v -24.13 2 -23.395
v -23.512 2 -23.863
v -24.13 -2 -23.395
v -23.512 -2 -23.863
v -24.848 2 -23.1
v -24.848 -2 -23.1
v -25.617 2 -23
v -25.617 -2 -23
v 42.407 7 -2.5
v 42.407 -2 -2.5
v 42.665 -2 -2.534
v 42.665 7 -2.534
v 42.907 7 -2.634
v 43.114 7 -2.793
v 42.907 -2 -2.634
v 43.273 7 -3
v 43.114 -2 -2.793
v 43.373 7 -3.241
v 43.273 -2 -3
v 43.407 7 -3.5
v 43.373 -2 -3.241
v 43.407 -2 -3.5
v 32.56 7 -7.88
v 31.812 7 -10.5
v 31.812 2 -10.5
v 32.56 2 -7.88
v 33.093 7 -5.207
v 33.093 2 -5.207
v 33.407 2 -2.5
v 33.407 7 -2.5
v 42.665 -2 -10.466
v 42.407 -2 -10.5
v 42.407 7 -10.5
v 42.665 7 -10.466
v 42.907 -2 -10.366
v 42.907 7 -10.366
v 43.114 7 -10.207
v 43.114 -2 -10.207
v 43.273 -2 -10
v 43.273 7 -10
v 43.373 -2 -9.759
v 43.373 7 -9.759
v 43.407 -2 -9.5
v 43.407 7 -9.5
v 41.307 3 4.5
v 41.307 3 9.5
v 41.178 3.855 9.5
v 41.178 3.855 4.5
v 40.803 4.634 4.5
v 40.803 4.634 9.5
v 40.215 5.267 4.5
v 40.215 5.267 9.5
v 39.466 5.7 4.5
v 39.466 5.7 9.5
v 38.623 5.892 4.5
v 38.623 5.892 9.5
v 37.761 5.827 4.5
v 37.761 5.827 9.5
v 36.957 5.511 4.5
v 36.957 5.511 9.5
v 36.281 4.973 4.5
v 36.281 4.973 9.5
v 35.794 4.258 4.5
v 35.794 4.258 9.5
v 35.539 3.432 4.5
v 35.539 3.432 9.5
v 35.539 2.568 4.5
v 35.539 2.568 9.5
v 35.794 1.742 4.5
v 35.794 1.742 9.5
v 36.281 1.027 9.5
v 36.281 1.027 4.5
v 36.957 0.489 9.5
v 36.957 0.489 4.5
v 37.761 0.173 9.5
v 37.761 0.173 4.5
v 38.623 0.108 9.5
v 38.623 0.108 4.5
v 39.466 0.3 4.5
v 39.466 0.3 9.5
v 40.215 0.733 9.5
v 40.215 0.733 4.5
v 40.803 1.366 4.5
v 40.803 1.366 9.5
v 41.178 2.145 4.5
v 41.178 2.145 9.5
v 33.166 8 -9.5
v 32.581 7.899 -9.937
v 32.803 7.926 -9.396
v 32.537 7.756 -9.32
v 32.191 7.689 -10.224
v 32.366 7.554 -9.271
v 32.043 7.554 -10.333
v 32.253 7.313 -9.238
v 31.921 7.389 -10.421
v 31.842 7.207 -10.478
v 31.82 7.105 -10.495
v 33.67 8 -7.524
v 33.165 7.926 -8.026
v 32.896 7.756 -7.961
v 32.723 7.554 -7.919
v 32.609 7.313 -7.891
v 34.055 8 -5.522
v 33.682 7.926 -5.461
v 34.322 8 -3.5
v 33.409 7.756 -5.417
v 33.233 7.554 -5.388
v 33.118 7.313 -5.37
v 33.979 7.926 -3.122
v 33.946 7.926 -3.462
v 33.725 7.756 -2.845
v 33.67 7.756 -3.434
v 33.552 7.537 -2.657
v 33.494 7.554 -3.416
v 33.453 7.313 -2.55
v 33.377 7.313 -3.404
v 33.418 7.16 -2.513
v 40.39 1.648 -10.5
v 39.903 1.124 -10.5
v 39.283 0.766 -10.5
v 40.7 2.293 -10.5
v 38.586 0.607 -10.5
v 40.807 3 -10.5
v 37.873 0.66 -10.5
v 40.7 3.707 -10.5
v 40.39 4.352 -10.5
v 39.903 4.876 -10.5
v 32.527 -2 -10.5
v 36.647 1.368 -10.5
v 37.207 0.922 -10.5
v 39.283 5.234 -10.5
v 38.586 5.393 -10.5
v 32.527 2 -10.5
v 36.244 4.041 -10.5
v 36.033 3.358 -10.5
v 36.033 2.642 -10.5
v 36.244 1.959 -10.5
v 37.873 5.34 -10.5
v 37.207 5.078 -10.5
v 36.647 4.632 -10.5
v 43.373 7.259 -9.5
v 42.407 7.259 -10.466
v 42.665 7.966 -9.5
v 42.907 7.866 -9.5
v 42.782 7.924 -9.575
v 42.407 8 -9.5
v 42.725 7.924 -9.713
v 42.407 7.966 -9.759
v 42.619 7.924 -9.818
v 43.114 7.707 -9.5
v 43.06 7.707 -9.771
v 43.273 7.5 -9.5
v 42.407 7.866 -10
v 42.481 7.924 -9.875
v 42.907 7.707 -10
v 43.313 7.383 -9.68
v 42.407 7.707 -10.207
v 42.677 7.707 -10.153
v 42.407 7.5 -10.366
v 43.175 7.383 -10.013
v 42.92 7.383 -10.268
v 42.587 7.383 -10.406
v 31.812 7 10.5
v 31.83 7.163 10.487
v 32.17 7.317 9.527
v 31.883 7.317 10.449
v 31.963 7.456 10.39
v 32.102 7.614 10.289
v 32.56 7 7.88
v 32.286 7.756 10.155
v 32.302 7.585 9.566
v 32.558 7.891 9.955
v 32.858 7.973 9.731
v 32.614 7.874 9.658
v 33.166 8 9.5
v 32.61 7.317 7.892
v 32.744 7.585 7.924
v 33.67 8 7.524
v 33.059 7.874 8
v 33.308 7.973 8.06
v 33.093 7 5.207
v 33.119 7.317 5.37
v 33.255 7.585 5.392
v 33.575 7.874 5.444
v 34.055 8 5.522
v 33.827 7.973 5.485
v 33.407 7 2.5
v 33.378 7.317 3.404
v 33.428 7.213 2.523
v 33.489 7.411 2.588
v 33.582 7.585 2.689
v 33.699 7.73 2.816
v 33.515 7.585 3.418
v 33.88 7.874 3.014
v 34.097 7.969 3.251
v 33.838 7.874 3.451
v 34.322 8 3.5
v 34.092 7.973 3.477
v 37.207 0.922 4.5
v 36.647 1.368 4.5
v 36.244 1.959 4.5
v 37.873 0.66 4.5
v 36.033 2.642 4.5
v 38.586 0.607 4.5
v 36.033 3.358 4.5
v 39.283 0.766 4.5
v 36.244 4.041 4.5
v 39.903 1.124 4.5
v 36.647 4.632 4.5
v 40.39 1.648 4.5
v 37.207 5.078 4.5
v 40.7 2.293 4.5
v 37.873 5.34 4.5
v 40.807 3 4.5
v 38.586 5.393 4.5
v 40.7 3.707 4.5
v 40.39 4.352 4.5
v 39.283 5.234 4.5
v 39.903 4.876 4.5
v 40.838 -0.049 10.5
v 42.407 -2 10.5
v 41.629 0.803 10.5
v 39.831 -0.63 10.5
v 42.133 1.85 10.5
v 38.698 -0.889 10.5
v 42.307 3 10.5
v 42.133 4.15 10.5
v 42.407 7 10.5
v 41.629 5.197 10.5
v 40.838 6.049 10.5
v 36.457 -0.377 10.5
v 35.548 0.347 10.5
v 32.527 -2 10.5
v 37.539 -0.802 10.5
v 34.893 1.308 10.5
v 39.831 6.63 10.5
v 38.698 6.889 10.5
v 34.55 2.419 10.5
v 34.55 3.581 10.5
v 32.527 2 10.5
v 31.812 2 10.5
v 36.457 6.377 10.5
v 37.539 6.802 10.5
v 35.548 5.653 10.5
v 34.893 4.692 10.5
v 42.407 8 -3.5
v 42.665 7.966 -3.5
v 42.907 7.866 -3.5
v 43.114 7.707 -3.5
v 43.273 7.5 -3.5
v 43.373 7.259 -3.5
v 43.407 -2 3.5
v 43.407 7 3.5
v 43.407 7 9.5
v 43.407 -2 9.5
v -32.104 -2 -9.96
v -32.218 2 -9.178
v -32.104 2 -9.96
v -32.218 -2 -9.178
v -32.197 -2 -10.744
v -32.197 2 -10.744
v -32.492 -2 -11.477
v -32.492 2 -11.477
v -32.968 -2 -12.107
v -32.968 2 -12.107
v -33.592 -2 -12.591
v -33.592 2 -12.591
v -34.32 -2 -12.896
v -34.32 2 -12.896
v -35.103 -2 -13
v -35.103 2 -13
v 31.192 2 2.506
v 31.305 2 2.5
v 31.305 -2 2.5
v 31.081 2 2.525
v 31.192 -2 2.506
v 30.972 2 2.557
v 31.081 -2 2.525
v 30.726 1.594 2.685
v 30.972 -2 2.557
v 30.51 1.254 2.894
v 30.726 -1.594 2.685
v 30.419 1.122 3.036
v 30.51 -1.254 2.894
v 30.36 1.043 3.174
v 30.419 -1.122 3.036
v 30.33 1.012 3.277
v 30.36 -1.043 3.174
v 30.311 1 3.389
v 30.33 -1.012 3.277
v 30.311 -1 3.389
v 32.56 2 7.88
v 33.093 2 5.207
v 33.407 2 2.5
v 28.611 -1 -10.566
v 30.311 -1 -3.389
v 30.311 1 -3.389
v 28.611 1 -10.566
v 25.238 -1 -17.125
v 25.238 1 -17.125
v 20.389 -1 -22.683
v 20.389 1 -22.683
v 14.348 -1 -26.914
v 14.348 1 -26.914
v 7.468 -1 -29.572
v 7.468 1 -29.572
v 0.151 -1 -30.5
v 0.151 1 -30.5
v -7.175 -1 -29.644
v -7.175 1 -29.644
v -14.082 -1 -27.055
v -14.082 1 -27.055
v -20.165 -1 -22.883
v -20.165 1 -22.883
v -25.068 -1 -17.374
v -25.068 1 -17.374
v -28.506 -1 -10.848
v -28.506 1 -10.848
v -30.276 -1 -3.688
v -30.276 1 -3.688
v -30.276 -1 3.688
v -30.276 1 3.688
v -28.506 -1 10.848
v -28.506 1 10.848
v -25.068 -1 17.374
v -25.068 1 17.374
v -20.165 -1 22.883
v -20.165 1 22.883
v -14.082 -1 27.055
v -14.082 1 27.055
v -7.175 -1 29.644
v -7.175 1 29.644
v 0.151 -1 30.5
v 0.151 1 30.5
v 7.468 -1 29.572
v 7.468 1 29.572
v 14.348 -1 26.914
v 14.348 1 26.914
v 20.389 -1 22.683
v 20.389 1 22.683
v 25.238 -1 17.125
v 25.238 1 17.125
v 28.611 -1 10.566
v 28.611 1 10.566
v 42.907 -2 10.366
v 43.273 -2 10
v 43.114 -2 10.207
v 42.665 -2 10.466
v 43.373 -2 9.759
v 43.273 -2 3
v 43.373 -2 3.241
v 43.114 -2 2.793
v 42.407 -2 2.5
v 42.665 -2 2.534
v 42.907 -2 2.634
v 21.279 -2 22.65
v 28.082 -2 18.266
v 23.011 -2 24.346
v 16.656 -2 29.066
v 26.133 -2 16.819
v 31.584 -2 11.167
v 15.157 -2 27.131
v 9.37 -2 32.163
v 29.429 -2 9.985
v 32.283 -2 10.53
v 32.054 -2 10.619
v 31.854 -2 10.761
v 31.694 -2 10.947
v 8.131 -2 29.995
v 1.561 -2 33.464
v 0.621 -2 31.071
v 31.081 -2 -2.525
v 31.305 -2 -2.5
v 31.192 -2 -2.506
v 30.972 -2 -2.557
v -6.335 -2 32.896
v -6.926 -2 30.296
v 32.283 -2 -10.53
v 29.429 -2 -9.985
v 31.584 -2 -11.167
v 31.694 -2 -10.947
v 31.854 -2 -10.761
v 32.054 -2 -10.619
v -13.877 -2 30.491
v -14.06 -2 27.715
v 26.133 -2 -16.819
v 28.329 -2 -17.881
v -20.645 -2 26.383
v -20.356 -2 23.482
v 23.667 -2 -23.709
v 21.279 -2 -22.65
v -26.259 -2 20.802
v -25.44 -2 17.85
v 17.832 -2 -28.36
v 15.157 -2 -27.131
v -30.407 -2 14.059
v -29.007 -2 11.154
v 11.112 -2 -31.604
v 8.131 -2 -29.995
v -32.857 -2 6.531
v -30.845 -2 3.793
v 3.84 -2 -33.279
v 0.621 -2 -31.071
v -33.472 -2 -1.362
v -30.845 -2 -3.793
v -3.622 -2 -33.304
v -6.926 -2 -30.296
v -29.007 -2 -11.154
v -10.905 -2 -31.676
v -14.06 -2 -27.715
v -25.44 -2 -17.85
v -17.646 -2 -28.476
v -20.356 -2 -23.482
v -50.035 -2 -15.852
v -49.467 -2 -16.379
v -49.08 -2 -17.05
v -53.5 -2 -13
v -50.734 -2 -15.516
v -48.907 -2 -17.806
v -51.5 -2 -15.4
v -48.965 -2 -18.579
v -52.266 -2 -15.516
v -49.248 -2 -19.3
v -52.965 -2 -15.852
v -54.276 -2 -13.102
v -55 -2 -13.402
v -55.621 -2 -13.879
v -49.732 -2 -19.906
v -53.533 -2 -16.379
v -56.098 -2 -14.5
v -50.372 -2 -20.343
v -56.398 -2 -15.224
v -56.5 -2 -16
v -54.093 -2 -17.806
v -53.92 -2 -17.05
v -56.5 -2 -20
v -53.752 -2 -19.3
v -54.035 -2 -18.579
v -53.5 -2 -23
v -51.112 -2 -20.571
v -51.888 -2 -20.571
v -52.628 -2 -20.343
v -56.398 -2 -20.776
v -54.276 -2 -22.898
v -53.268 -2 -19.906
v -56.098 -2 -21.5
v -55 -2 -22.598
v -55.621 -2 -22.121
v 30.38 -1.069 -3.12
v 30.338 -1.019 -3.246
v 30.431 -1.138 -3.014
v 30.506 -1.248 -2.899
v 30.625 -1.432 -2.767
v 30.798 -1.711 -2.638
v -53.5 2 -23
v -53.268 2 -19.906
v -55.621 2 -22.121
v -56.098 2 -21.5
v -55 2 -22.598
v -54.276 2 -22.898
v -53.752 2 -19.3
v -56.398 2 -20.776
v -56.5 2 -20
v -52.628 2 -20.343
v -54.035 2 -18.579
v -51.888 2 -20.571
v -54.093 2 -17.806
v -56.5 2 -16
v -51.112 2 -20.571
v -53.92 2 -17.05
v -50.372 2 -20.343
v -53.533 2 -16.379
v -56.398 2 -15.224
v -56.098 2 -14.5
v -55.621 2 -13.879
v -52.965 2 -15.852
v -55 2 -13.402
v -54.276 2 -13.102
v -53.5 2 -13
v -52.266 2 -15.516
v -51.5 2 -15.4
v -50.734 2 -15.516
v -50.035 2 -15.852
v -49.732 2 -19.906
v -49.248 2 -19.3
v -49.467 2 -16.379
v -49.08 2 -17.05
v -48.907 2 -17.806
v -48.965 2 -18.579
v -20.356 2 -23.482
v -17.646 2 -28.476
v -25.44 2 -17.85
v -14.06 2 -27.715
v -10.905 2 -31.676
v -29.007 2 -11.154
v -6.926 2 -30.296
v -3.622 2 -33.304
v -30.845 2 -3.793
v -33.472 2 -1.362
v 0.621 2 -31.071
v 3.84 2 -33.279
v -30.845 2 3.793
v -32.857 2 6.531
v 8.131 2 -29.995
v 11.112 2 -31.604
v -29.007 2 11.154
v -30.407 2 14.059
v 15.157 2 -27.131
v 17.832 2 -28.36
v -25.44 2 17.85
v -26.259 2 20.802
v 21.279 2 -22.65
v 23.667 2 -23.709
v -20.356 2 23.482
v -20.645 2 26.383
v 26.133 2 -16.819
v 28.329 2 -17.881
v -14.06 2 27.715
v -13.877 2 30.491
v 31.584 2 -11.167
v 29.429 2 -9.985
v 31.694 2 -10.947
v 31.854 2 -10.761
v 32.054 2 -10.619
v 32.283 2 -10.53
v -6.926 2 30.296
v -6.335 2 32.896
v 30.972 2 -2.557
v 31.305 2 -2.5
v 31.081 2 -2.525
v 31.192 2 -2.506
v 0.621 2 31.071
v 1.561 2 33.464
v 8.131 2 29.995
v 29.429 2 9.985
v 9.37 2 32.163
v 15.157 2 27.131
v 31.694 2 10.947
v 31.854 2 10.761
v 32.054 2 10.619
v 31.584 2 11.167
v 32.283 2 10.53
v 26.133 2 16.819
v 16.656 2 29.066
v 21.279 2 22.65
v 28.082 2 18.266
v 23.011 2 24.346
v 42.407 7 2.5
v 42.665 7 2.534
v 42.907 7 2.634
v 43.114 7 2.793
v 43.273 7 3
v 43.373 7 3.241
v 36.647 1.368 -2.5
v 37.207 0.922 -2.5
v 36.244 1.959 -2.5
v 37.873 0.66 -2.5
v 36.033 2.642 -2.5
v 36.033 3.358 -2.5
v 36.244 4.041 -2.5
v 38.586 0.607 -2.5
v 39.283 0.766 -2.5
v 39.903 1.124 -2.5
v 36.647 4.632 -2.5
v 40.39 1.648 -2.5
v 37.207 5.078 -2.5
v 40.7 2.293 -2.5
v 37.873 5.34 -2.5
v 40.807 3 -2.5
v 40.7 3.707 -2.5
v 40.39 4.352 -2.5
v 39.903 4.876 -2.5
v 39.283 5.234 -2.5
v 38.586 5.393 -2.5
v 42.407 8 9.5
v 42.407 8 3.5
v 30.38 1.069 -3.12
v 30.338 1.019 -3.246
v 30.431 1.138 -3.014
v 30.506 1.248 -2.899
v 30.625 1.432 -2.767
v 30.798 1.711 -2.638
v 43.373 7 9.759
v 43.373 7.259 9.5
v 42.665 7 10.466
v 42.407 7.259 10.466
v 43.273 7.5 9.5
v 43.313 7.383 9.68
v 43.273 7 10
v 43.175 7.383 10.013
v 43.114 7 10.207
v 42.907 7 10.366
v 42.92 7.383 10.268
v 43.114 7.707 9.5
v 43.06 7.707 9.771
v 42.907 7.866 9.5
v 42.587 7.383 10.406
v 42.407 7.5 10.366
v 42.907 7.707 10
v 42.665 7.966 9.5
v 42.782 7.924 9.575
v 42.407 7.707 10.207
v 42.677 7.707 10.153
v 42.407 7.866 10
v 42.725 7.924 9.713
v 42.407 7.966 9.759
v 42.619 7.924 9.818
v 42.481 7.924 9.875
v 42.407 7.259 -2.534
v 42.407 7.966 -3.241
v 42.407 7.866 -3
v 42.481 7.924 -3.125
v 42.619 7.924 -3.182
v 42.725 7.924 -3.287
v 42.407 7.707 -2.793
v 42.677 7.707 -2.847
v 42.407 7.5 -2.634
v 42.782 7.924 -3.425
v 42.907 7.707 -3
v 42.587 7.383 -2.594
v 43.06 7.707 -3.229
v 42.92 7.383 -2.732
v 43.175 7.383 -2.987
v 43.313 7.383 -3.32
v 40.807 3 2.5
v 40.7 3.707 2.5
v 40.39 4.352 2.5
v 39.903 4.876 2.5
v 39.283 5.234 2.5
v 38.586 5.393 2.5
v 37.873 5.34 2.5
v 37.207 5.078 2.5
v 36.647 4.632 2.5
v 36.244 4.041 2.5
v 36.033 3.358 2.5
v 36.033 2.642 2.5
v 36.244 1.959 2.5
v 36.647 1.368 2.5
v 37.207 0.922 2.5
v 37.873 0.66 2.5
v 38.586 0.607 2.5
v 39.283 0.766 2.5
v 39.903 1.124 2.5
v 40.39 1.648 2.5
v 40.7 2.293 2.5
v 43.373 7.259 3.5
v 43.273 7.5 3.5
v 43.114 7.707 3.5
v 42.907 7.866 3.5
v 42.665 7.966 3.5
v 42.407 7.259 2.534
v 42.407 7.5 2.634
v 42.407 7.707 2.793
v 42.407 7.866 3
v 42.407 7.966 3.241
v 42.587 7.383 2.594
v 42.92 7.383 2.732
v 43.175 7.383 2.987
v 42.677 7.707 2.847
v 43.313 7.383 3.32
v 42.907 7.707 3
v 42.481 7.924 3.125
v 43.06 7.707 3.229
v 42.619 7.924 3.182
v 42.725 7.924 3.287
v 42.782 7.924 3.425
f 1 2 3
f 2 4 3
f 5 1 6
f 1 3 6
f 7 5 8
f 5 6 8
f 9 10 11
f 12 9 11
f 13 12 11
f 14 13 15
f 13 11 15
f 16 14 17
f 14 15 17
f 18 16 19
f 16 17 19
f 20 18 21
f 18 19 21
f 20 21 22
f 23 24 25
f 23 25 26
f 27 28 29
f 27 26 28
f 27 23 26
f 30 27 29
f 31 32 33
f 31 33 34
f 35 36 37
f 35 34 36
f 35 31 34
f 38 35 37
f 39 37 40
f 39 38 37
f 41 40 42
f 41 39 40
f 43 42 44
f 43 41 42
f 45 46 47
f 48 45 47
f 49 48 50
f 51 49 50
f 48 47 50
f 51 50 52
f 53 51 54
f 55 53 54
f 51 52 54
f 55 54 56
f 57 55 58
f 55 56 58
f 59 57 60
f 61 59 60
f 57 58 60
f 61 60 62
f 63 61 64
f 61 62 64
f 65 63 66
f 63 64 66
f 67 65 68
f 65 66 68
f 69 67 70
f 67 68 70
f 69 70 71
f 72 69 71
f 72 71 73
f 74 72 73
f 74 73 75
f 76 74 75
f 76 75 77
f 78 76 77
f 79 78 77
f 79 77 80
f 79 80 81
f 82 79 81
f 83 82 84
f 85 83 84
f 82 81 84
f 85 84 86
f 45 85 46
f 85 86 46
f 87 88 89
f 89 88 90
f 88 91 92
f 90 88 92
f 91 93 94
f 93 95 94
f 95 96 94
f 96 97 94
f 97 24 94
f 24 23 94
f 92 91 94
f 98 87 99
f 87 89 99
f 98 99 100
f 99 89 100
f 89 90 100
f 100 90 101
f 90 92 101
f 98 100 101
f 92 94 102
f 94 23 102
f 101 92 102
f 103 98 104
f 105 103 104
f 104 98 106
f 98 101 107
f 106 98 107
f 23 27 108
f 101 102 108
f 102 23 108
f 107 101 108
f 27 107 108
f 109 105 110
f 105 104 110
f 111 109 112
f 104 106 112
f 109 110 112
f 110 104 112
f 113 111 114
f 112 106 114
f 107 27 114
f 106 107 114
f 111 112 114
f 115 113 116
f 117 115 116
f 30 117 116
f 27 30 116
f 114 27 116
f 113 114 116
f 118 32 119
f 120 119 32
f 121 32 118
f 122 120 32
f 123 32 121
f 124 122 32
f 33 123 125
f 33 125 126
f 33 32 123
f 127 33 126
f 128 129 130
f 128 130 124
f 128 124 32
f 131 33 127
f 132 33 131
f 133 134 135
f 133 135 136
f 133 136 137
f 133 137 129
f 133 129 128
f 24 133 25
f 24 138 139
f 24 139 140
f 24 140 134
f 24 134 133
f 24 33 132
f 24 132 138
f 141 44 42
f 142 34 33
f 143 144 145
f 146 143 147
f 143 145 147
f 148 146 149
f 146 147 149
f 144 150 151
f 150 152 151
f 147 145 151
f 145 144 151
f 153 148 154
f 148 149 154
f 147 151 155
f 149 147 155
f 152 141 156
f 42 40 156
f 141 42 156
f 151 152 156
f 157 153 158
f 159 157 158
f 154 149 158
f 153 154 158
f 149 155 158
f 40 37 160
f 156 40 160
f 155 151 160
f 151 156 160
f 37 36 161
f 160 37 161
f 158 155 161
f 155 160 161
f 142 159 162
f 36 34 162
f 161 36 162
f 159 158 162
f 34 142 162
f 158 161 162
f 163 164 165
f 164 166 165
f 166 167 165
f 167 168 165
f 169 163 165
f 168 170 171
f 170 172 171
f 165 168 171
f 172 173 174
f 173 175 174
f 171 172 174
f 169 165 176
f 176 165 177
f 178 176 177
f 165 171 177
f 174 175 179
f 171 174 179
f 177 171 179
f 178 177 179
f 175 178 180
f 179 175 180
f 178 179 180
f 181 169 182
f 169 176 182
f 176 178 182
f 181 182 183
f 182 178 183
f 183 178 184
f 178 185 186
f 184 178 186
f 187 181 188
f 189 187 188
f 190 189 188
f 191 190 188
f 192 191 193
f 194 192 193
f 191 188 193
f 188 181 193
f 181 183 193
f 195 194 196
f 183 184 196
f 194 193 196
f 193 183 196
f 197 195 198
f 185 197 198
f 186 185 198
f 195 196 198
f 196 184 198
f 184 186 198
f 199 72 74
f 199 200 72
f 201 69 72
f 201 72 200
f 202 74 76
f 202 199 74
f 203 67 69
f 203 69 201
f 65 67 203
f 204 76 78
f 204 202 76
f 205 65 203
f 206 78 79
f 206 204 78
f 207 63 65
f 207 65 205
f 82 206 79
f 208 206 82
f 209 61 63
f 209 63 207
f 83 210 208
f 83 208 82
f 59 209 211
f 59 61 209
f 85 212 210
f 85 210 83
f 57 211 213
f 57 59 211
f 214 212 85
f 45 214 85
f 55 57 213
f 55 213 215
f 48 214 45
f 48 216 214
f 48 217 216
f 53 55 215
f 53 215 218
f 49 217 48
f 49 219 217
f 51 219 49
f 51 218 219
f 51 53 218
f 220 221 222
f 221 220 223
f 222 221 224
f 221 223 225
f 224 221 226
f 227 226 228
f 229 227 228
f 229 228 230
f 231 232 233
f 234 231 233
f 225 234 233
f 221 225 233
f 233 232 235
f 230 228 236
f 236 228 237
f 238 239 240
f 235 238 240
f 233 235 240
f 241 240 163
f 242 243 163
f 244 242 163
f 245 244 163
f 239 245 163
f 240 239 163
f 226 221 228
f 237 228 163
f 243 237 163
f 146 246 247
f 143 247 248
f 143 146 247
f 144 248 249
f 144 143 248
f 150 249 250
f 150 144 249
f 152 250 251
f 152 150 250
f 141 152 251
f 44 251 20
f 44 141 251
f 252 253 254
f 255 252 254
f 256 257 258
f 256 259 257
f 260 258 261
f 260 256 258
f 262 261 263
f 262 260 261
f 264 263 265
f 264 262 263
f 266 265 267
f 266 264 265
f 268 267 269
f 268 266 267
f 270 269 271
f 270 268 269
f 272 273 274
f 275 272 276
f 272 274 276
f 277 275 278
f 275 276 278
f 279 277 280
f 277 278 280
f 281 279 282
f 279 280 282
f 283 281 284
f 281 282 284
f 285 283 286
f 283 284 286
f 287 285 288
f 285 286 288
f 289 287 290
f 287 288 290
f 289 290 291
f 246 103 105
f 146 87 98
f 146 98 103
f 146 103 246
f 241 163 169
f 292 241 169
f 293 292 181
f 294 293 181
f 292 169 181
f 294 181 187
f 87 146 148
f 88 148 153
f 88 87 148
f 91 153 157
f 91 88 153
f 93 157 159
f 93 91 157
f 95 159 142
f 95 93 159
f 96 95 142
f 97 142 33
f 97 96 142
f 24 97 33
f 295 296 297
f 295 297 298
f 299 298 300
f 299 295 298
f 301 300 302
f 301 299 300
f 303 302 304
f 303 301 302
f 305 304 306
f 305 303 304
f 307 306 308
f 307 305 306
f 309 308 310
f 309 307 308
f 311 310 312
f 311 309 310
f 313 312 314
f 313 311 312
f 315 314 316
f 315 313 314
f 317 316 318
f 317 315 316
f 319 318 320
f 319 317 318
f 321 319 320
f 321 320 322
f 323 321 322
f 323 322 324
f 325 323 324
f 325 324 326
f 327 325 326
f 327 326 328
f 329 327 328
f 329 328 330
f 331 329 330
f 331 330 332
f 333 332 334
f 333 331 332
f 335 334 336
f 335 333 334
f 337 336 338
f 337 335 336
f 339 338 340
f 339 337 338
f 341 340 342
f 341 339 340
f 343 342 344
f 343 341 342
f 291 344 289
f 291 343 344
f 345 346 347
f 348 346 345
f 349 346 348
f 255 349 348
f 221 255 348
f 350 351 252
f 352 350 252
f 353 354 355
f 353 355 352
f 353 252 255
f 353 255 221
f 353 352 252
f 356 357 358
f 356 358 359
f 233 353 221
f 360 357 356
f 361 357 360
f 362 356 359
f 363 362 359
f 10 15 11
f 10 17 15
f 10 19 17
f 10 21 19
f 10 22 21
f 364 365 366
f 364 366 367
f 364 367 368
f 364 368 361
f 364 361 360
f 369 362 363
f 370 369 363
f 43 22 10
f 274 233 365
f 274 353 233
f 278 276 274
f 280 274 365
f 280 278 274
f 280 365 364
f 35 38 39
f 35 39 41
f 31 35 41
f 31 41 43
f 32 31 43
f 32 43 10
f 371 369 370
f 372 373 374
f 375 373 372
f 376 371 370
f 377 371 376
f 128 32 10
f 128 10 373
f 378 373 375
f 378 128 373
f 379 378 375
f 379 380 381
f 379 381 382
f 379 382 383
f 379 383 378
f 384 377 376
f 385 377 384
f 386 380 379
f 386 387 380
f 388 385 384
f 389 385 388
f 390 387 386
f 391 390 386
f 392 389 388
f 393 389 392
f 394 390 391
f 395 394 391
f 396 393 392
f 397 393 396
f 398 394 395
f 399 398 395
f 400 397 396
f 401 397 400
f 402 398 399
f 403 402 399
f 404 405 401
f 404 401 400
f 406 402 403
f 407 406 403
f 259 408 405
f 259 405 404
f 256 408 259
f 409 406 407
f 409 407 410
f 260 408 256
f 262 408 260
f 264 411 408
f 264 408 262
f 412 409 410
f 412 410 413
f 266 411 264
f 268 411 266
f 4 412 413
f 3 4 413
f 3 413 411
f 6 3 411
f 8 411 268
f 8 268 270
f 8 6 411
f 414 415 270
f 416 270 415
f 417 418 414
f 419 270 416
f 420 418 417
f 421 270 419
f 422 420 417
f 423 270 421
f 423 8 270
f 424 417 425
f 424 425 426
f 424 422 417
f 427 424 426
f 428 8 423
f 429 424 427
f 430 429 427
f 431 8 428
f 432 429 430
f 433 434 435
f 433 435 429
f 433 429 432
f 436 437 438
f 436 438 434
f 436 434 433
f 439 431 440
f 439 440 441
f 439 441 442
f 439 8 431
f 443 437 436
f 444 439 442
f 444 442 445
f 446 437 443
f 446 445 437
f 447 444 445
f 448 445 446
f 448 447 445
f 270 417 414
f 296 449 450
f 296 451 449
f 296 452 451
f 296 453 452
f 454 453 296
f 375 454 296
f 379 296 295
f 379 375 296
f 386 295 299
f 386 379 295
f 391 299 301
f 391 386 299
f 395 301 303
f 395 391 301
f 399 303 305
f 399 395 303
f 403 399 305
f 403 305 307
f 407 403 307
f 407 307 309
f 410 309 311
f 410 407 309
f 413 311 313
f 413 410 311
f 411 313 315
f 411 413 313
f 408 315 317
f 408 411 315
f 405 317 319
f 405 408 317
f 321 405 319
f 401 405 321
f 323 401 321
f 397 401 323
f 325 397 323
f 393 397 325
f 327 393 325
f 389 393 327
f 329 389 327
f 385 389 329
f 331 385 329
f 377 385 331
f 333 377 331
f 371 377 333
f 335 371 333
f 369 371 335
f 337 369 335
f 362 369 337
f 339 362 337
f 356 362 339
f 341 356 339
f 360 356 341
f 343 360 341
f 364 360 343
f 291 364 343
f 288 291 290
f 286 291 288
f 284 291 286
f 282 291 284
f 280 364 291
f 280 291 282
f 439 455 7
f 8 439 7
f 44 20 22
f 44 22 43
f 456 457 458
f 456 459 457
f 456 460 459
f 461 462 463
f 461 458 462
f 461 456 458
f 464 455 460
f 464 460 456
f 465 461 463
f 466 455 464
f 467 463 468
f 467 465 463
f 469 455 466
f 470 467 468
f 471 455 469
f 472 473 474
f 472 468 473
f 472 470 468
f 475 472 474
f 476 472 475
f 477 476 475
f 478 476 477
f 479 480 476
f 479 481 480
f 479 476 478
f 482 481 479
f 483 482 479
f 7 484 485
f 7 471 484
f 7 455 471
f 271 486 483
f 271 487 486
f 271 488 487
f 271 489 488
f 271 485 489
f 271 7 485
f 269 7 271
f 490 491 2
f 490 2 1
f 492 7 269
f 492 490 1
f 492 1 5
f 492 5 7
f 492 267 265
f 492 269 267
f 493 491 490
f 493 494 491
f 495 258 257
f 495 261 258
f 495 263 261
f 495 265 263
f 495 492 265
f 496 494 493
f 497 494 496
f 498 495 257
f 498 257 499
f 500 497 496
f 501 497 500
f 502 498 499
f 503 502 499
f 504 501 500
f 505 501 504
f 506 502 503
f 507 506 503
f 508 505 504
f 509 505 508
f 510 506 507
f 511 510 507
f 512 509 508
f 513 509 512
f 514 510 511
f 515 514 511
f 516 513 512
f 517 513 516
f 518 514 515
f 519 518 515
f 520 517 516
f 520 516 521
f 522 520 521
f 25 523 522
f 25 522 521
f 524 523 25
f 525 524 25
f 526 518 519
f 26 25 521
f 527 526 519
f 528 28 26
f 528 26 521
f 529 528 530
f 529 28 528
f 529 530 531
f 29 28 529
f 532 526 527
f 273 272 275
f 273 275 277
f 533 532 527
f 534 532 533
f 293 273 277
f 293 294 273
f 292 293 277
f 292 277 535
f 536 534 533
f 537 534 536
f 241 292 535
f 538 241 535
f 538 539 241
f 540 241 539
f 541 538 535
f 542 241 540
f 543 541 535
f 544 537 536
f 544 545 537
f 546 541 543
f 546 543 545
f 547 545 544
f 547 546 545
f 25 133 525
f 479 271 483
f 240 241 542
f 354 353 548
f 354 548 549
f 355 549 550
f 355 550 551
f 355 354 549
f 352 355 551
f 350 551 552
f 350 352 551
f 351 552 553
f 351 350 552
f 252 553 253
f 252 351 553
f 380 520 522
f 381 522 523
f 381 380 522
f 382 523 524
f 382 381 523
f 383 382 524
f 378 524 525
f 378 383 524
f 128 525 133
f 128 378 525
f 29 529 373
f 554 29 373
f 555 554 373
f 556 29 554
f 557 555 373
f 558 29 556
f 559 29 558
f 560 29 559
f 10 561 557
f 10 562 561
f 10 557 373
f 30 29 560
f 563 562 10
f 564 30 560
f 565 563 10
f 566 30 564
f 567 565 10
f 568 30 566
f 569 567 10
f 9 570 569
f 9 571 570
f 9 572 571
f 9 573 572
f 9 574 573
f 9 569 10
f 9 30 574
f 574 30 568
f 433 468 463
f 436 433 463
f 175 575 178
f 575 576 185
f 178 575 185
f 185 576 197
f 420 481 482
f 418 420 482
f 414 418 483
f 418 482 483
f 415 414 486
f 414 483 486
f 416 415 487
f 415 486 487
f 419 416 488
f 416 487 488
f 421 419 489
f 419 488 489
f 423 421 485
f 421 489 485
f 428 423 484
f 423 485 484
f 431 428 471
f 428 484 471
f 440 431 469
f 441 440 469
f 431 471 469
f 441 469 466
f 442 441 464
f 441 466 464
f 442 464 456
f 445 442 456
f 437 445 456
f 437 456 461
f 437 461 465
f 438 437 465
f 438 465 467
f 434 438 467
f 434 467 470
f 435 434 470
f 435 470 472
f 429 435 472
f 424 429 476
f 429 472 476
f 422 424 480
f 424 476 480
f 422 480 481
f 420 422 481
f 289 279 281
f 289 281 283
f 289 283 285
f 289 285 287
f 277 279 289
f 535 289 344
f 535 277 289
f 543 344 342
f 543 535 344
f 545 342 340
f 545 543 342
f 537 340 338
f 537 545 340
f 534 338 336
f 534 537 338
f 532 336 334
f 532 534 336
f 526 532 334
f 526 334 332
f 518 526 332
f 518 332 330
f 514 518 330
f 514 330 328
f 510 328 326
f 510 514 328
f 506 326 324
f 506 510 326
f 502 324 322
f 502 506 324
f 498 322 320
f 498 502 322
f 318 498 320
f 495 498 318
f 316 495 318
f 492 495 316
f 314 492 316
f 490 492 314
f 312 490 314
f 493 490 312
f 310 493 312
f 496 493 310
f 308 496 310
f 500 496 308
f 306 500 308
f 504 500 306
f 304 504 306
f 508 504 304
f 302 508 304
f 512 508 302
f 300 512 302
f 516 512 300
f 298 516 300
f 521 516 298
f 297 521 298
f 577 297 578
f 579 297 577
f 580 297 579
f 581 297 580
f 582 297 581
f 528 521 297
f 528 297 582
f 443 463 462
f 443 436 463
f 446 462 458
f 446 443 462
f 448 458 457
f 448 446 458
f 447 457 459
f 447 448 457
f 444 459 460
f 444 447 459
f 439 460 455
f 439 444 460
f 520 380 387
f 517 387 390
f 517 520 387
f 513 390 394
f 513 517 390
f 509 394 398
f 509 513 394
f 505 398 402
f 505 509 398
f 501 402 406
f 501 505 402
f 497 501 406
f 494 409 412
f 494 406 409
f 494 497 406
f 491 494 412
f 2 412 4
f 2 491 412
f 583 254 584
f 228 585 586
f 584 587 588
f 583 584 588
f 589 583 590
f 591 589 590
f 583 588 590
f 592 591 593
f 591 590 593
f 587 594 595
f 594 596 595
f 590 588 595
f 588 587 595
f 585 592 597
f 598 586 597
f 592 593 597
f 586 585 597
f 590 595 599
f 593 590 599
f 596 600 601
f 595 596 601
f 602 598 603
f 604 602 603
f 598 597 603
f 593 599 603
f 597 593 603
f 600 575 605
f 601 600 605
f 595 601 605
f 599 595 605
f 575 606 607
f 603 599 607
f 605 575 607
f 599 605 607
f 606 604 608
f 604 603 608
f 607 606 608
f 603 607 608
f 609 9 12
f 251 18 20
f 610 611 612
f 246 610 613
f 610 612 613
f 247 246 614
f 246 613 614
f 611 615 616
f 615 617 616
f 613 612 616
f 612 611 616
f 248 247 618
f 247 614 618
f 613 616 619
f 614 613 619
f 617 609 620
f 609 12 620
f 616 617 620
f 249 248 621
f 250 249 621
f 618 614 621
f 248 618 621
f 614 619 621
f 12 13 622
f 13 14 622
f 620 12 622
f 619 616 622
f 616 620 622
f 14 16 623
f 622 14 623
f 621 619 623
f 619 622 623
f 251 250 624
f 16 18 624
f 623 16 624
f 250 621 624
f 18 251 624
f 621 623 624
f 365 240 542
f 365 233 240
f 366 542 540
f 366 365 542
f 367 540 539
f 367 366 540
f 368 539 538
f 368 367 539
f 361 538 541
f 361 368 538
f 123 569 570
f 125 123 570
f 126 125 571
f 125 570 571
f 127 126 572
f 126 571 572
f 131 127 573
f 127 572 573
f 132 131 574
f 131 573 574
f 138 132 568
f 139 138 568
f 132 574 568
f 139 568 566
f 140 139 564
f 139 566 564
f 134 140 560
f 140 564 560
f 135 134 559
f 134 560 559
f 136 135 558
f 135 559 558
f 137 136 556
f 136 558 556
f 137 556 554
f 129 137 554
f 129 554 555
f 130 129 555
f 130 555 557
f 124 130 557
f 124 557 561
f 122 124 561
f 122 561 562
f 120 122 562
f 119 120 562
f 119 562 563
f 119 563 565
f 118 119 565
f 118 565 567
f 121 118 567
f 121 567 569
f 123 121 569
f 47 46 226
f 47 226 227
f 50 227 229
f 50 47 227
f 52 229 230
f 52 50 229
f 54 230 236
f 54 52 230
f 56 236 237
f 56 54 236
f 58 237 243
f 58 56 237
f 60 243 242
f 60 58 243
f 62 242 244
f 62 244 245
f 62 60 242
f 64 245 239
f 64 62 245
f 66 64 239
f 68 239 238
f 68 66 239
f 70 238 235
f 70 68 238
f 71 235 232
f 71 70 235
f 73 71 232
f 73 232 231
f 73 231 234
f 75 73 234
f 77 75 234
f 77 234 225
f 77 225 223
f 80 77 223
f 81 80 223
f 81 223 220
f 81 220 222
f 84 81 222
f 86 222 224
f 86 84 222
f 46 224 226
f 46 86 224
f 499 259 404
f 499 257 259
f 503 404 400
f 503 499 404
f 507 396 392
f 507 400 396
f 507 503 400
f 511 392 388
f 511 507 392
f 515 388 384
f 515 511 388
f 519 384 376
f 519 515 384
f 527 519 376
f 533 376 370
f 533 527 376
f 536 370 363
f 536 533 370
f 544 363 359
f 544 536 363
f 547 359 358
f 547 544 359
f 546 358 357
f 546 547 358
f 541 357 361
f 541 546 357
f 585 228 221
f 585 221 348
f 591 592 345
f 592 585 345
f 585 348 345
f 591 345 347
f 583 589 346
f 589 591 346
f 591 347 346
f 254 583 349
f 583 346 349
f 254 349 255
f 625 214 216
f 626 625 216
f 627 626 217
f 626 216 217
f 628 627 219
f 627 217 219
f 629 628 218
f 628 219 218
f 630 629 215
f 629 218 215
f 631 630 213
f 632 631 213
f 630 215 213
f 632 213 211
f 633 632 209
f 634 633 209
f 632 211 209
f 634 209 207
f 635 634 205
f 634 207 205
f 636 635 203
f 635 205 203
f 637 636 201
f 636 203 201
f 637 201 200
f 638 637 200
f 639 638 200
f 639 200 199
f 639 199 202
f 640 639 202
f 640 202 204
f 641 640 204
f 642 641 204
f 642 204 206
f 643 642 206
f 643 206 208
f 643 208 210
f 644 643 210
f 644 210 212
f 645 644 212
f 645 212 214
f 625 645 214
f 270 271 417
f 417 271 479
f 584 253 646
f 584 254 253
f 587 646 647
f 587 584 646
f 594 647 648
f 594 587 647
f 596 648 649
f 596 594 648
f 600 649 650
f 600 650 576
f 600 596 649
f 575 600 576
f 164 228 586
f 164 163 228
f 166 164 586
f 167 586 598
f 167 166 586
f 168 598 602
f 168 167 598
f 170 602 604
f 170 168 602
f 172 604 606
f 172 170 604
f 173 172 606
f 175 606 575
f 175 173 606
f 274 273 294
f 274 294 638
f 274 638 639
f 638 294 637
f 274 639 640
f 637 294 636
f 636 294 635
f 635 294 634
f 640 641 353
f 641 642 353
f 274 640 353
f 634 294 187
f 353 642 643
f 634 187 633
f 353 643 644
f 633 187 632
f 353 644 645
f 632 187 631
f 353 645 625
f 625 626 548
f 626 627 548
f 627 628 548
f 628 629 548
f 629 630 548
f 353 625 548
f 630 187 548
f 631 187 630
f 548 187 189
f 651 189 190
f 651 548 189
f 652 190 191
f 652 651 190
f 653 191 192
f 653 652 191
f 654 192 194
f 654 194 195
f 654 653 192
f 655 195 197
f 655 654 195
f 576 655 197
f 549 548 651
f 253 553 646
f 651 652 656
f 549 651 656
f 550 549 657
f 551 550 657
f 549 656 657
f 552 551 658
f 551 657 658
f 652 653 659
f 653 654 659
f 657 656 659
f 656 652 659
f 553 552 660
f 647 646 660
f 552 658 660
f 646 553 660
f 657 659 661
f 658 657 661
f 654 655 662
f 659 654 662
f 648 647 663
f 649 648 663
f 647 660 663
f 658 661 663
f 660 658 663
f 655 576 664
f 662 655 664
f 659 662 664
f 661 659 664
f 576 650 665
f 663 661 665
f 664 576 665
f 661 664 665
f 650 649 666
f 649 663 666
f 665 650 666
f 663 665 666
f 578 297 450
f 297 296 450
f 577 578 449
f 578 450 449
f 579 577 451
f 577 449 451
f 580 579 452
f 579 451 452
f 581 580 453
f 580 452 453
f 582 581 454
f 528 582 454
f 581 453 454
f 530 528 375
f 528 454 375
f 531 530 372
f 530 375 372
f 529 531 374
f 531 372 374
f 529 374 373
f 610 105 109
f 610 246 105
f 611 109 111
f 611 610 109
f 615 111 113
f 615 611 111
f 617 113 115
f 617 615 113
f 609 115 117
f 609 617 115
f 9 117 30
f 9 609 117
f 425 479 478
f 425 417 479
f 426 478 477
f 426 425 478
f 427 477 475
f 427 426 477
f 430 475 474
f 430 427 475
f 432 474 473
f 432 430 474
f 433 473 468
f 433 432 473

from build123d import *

# Parameters (mm, degrees)
SKETCH_1_R          = 33.5
SKETCH_1_R_2        = 30.5
EXTRUDE_1_DEPTH     = 2
SKETCH_3_W          = 10
SKETCH_3_H          = 5
CUT_EXTRUDE_1_DEPTH = 48.544715795
EXTRUDE_START       = 10
EXTRUDE_2_DEPTH     = 10
SKETCH_5_R          = 2.9
CUT_EXTRUDE_2_DEPTH = 6
SKETCH_6_R          = 2.4
CUT_EXTRUDE_3_DEPTH = 59.242009954
FILLET_9_R          = 1
FILLET_11_R         = 1
FILLET_12_R         = 1
CHAMFER_1_SIZE      = 1
SKETCH_7_R          = 2.6
EXTRUDE_3_DEPTH     = 4
FILLET_13_R         = 3
CHAMFER_2_SIZE      = 1
CHAMFER_2_SIZE2     = 0.577350269
CHAMFER_3_SIZE      = 1
CHAMFER_3_SIZE2     = 0.577350269
FILLET_14_R         = 1


with BuildPart() as part:
    # 草圖1 → 填料-伸長1 (new, symmetric)
    with BuildSketch(Plane(origin=(0, 0, 0), x_dir=(1, 0, 0), z_dir=(0, 1, 0))):
        with Locations(Location((0, 0, 0), (0, 0, 270))):
            Circle(SKETCH_1_R)
        with Locations(Location((0, 0, 0), (0, 0, 270))):
            Circle(SKETCH_1_R_2, mode=Mode.SUBTRACT)
    extrude(amount=EXTRUDE_1_DEPTH, both=True)

    # 草圖3 → 除料-伸長1 (cut, through all)
    with BuildSketch(Plane(origin=(0, 2, 0), x_dir=(1, 0, 0), z_dir=(0, 1, 0))):
        with Locations((35.397368307, 0)):
            Rectangle(SKETCH_3_W, SKETCH_3_H)
    extrude(amount=-CUT_EXTRUDE_1_DEPTH, mode=Mode.SUBTRACT)

    # 草圖4 → 填料-伸長2 (add)
    with BuildSketch(Plane(origin=(0, -2, 0), x_dir=(1, 0, 0), z_dir=(0, 1, 0)).offset(EXTRUDE_START)):
        with BuildLine():
            Line((33.406586177, -2.5), (43.406586177, -2.5))
            Line((43.406586177, -2.5), (43.406586177, -10.5))
            Line((43.406586177, -10.5), (31.811947441, -10.5))
            ThreePointArc((31.811947441, -10.5), (32.853679883, -6.548718819), (33.406586177, -2.5))
        make_face()
        with BuildLine():
            Line((43.406586177, 10.5), (31.811947441, 10.5))
            ThreePointArc((31.811947441, 10.5), (32.853679883, 6.548718819), (33.406586177, 2.5))
            Line((33.406586177, 2.5), (43.406586177, 2.5))
            Line((43.406586177, 2.5), (43.406586177, 10.5))
        make_face()
    extrude(amount=-EXTRUDE_2_DEPTH)

    # 草圖5 → 除料-伸長2 (cut)
    with BuildSketch(Plane.XY.offset(10.5)):
        with Locations((38.406586177, 3)):
            Circle(SKETCH_5_R)
    extrude(amount=-CUT_EXTRUDE_2_DEPTH, mode=Mode.SUBTRACT)

    # 草圖6 → 除料-伸長3 (cut, through all)
    with BuildSketch(Plane.XY.offset(4.5)):
        with Locations((38.406586177, 3)):
            Circle(SKETCH_6_R)
    extrude(amount=-CUT_EXTRUDE_3_DEPTH, mode=Mode.SUBTRACT)

    # 圓角9
    fillet_9_edges = [part.edges().sort_by_distance(p)[0] for p in [
        (31.811947441, 0, 10.5),
        (31.811947441, 0, -10.5),
    ]]
    fillet(fillet_9_edges, radius=FILLET_9_R)

    # 圓角11
    fillet_11_edges = [part.edges().sort_by_distance(p)[0] for p in [
        (43.406586177, 3, 10.5),
        (43.406586177, 3, 2.5),
        (43.406586177, 3, -2.5),
        (43.406586177, 3, -10.5),
    ]]
    fillet(fillet_11_edges, radius=FILLET_11_R)

    # 圓角12
    fillet_12_edges = [part.edges().sort_by_distance(p)[0] for p in [
        (43.406586177, 8, -6.5),
        (43.113692958, 8, -2.792893219),
        (43.113692958, 8, -10.207106781),
        (37.906586177, 8, 2.5),
        (43.406586177, 8, 6.5),
        (43.113692958, 8, 10.207106781),
        (43.113692958, 8, 2.792893219),
        (32.853679883, 8, 6.548718819),
        (37.109266809, 8, 10.5),
        (32.853679883, 8, -6.548718819),
        (37.906586177, 8, -2.5),
        (37.109266809, 8, -10.5),
    ]]
    fillet(fillet_12_edges, radius=FILLET_12_R)

    # 導角1
    chamfer_1_edges = [part.edges().sort_by_distance(p)[0] for p in [
        (35.506586177, 3, 10.5),
    ]]
    chamfer(chamfer_1_edges, length=CHAMFER_1_SIZE)

    # 草圖7 → 填料-伸長3 (add)
    with BuildSketch(Plane(origin=(0, 2, 0), x_dir=(1, 0, 0), z_dir=(0, 1, 0))):
        with BuildLine():
            Line((-30.874746963, 13), (-56.5, 13))
            Line((-56.5, 13), (-56.5, 23))
            Line((-56.5, 23), (-24.356723918, 23))
            ThreePointArc((-24.356723918, 23), (-28.064725972, 18.292653064), (-30.874746963, 13))
        make_face()
        with Locations(Location((-51.5, 18, 0), (0, 0, 270))):
            Circle(SKETCH_7_R, mode=Mode.SUBTRACT)
    extrude(amount=-EXTRUDE_3_DEPTH)

    # 圓角13
    fillet_13_edges = [part.edges().sort_by_distance(p)[0] for p in [
        (-30.874746963, 0, -13),
        (-24.356723918, 0, -23),
        (-56.5, 0, -23),
        (-56.5, 0, -13),
    ]]
    fillet(fillet_13_edges, radius=FILLET_13_R)

    # 導角2
    chamfer_2_edges = [part.edges().sort_by_distance(p)[0] for p in [
        (-30.5, 2, 0),
    ]]
    chamfer_2_side = [part.faces().sort_by_distance(p)[0] for p in [
        (-30.5, 0, 0),
    ]]
    chamfer(chamfer_2_edges, length=CHAMFER_2_SIZE, length2=CHAMFER_2_SIZE2, reference=chamfer_2_side[0])

    # 導角3
    chamfer_3_edges = [part.edges().sort_by_distance(p)[0] for p in [
        (-30.5, -2, 0),
    ]]
    chamfer_3_side = [part.faces().sort_by_distance(p)[0] for p in [
        (-30.5, -0.5, 0),
    ]]
    chamfer(chamfer_3_edges, length=CHAMFER_3_SIZE, length2=CHAMFER_3_SIZE2, reference=chamfer_3_side[0])

    # 圓角14
    fillet_14_edges = [part.edges().sort_by_distance(p)[0] for p in [
        (30.397368307, 0, -2.5),
        (30.397368307, 0, 2.5),
    ]]
    fillet(fillet_14_edges, radius=FILLET_14_R)


solid = part.part
